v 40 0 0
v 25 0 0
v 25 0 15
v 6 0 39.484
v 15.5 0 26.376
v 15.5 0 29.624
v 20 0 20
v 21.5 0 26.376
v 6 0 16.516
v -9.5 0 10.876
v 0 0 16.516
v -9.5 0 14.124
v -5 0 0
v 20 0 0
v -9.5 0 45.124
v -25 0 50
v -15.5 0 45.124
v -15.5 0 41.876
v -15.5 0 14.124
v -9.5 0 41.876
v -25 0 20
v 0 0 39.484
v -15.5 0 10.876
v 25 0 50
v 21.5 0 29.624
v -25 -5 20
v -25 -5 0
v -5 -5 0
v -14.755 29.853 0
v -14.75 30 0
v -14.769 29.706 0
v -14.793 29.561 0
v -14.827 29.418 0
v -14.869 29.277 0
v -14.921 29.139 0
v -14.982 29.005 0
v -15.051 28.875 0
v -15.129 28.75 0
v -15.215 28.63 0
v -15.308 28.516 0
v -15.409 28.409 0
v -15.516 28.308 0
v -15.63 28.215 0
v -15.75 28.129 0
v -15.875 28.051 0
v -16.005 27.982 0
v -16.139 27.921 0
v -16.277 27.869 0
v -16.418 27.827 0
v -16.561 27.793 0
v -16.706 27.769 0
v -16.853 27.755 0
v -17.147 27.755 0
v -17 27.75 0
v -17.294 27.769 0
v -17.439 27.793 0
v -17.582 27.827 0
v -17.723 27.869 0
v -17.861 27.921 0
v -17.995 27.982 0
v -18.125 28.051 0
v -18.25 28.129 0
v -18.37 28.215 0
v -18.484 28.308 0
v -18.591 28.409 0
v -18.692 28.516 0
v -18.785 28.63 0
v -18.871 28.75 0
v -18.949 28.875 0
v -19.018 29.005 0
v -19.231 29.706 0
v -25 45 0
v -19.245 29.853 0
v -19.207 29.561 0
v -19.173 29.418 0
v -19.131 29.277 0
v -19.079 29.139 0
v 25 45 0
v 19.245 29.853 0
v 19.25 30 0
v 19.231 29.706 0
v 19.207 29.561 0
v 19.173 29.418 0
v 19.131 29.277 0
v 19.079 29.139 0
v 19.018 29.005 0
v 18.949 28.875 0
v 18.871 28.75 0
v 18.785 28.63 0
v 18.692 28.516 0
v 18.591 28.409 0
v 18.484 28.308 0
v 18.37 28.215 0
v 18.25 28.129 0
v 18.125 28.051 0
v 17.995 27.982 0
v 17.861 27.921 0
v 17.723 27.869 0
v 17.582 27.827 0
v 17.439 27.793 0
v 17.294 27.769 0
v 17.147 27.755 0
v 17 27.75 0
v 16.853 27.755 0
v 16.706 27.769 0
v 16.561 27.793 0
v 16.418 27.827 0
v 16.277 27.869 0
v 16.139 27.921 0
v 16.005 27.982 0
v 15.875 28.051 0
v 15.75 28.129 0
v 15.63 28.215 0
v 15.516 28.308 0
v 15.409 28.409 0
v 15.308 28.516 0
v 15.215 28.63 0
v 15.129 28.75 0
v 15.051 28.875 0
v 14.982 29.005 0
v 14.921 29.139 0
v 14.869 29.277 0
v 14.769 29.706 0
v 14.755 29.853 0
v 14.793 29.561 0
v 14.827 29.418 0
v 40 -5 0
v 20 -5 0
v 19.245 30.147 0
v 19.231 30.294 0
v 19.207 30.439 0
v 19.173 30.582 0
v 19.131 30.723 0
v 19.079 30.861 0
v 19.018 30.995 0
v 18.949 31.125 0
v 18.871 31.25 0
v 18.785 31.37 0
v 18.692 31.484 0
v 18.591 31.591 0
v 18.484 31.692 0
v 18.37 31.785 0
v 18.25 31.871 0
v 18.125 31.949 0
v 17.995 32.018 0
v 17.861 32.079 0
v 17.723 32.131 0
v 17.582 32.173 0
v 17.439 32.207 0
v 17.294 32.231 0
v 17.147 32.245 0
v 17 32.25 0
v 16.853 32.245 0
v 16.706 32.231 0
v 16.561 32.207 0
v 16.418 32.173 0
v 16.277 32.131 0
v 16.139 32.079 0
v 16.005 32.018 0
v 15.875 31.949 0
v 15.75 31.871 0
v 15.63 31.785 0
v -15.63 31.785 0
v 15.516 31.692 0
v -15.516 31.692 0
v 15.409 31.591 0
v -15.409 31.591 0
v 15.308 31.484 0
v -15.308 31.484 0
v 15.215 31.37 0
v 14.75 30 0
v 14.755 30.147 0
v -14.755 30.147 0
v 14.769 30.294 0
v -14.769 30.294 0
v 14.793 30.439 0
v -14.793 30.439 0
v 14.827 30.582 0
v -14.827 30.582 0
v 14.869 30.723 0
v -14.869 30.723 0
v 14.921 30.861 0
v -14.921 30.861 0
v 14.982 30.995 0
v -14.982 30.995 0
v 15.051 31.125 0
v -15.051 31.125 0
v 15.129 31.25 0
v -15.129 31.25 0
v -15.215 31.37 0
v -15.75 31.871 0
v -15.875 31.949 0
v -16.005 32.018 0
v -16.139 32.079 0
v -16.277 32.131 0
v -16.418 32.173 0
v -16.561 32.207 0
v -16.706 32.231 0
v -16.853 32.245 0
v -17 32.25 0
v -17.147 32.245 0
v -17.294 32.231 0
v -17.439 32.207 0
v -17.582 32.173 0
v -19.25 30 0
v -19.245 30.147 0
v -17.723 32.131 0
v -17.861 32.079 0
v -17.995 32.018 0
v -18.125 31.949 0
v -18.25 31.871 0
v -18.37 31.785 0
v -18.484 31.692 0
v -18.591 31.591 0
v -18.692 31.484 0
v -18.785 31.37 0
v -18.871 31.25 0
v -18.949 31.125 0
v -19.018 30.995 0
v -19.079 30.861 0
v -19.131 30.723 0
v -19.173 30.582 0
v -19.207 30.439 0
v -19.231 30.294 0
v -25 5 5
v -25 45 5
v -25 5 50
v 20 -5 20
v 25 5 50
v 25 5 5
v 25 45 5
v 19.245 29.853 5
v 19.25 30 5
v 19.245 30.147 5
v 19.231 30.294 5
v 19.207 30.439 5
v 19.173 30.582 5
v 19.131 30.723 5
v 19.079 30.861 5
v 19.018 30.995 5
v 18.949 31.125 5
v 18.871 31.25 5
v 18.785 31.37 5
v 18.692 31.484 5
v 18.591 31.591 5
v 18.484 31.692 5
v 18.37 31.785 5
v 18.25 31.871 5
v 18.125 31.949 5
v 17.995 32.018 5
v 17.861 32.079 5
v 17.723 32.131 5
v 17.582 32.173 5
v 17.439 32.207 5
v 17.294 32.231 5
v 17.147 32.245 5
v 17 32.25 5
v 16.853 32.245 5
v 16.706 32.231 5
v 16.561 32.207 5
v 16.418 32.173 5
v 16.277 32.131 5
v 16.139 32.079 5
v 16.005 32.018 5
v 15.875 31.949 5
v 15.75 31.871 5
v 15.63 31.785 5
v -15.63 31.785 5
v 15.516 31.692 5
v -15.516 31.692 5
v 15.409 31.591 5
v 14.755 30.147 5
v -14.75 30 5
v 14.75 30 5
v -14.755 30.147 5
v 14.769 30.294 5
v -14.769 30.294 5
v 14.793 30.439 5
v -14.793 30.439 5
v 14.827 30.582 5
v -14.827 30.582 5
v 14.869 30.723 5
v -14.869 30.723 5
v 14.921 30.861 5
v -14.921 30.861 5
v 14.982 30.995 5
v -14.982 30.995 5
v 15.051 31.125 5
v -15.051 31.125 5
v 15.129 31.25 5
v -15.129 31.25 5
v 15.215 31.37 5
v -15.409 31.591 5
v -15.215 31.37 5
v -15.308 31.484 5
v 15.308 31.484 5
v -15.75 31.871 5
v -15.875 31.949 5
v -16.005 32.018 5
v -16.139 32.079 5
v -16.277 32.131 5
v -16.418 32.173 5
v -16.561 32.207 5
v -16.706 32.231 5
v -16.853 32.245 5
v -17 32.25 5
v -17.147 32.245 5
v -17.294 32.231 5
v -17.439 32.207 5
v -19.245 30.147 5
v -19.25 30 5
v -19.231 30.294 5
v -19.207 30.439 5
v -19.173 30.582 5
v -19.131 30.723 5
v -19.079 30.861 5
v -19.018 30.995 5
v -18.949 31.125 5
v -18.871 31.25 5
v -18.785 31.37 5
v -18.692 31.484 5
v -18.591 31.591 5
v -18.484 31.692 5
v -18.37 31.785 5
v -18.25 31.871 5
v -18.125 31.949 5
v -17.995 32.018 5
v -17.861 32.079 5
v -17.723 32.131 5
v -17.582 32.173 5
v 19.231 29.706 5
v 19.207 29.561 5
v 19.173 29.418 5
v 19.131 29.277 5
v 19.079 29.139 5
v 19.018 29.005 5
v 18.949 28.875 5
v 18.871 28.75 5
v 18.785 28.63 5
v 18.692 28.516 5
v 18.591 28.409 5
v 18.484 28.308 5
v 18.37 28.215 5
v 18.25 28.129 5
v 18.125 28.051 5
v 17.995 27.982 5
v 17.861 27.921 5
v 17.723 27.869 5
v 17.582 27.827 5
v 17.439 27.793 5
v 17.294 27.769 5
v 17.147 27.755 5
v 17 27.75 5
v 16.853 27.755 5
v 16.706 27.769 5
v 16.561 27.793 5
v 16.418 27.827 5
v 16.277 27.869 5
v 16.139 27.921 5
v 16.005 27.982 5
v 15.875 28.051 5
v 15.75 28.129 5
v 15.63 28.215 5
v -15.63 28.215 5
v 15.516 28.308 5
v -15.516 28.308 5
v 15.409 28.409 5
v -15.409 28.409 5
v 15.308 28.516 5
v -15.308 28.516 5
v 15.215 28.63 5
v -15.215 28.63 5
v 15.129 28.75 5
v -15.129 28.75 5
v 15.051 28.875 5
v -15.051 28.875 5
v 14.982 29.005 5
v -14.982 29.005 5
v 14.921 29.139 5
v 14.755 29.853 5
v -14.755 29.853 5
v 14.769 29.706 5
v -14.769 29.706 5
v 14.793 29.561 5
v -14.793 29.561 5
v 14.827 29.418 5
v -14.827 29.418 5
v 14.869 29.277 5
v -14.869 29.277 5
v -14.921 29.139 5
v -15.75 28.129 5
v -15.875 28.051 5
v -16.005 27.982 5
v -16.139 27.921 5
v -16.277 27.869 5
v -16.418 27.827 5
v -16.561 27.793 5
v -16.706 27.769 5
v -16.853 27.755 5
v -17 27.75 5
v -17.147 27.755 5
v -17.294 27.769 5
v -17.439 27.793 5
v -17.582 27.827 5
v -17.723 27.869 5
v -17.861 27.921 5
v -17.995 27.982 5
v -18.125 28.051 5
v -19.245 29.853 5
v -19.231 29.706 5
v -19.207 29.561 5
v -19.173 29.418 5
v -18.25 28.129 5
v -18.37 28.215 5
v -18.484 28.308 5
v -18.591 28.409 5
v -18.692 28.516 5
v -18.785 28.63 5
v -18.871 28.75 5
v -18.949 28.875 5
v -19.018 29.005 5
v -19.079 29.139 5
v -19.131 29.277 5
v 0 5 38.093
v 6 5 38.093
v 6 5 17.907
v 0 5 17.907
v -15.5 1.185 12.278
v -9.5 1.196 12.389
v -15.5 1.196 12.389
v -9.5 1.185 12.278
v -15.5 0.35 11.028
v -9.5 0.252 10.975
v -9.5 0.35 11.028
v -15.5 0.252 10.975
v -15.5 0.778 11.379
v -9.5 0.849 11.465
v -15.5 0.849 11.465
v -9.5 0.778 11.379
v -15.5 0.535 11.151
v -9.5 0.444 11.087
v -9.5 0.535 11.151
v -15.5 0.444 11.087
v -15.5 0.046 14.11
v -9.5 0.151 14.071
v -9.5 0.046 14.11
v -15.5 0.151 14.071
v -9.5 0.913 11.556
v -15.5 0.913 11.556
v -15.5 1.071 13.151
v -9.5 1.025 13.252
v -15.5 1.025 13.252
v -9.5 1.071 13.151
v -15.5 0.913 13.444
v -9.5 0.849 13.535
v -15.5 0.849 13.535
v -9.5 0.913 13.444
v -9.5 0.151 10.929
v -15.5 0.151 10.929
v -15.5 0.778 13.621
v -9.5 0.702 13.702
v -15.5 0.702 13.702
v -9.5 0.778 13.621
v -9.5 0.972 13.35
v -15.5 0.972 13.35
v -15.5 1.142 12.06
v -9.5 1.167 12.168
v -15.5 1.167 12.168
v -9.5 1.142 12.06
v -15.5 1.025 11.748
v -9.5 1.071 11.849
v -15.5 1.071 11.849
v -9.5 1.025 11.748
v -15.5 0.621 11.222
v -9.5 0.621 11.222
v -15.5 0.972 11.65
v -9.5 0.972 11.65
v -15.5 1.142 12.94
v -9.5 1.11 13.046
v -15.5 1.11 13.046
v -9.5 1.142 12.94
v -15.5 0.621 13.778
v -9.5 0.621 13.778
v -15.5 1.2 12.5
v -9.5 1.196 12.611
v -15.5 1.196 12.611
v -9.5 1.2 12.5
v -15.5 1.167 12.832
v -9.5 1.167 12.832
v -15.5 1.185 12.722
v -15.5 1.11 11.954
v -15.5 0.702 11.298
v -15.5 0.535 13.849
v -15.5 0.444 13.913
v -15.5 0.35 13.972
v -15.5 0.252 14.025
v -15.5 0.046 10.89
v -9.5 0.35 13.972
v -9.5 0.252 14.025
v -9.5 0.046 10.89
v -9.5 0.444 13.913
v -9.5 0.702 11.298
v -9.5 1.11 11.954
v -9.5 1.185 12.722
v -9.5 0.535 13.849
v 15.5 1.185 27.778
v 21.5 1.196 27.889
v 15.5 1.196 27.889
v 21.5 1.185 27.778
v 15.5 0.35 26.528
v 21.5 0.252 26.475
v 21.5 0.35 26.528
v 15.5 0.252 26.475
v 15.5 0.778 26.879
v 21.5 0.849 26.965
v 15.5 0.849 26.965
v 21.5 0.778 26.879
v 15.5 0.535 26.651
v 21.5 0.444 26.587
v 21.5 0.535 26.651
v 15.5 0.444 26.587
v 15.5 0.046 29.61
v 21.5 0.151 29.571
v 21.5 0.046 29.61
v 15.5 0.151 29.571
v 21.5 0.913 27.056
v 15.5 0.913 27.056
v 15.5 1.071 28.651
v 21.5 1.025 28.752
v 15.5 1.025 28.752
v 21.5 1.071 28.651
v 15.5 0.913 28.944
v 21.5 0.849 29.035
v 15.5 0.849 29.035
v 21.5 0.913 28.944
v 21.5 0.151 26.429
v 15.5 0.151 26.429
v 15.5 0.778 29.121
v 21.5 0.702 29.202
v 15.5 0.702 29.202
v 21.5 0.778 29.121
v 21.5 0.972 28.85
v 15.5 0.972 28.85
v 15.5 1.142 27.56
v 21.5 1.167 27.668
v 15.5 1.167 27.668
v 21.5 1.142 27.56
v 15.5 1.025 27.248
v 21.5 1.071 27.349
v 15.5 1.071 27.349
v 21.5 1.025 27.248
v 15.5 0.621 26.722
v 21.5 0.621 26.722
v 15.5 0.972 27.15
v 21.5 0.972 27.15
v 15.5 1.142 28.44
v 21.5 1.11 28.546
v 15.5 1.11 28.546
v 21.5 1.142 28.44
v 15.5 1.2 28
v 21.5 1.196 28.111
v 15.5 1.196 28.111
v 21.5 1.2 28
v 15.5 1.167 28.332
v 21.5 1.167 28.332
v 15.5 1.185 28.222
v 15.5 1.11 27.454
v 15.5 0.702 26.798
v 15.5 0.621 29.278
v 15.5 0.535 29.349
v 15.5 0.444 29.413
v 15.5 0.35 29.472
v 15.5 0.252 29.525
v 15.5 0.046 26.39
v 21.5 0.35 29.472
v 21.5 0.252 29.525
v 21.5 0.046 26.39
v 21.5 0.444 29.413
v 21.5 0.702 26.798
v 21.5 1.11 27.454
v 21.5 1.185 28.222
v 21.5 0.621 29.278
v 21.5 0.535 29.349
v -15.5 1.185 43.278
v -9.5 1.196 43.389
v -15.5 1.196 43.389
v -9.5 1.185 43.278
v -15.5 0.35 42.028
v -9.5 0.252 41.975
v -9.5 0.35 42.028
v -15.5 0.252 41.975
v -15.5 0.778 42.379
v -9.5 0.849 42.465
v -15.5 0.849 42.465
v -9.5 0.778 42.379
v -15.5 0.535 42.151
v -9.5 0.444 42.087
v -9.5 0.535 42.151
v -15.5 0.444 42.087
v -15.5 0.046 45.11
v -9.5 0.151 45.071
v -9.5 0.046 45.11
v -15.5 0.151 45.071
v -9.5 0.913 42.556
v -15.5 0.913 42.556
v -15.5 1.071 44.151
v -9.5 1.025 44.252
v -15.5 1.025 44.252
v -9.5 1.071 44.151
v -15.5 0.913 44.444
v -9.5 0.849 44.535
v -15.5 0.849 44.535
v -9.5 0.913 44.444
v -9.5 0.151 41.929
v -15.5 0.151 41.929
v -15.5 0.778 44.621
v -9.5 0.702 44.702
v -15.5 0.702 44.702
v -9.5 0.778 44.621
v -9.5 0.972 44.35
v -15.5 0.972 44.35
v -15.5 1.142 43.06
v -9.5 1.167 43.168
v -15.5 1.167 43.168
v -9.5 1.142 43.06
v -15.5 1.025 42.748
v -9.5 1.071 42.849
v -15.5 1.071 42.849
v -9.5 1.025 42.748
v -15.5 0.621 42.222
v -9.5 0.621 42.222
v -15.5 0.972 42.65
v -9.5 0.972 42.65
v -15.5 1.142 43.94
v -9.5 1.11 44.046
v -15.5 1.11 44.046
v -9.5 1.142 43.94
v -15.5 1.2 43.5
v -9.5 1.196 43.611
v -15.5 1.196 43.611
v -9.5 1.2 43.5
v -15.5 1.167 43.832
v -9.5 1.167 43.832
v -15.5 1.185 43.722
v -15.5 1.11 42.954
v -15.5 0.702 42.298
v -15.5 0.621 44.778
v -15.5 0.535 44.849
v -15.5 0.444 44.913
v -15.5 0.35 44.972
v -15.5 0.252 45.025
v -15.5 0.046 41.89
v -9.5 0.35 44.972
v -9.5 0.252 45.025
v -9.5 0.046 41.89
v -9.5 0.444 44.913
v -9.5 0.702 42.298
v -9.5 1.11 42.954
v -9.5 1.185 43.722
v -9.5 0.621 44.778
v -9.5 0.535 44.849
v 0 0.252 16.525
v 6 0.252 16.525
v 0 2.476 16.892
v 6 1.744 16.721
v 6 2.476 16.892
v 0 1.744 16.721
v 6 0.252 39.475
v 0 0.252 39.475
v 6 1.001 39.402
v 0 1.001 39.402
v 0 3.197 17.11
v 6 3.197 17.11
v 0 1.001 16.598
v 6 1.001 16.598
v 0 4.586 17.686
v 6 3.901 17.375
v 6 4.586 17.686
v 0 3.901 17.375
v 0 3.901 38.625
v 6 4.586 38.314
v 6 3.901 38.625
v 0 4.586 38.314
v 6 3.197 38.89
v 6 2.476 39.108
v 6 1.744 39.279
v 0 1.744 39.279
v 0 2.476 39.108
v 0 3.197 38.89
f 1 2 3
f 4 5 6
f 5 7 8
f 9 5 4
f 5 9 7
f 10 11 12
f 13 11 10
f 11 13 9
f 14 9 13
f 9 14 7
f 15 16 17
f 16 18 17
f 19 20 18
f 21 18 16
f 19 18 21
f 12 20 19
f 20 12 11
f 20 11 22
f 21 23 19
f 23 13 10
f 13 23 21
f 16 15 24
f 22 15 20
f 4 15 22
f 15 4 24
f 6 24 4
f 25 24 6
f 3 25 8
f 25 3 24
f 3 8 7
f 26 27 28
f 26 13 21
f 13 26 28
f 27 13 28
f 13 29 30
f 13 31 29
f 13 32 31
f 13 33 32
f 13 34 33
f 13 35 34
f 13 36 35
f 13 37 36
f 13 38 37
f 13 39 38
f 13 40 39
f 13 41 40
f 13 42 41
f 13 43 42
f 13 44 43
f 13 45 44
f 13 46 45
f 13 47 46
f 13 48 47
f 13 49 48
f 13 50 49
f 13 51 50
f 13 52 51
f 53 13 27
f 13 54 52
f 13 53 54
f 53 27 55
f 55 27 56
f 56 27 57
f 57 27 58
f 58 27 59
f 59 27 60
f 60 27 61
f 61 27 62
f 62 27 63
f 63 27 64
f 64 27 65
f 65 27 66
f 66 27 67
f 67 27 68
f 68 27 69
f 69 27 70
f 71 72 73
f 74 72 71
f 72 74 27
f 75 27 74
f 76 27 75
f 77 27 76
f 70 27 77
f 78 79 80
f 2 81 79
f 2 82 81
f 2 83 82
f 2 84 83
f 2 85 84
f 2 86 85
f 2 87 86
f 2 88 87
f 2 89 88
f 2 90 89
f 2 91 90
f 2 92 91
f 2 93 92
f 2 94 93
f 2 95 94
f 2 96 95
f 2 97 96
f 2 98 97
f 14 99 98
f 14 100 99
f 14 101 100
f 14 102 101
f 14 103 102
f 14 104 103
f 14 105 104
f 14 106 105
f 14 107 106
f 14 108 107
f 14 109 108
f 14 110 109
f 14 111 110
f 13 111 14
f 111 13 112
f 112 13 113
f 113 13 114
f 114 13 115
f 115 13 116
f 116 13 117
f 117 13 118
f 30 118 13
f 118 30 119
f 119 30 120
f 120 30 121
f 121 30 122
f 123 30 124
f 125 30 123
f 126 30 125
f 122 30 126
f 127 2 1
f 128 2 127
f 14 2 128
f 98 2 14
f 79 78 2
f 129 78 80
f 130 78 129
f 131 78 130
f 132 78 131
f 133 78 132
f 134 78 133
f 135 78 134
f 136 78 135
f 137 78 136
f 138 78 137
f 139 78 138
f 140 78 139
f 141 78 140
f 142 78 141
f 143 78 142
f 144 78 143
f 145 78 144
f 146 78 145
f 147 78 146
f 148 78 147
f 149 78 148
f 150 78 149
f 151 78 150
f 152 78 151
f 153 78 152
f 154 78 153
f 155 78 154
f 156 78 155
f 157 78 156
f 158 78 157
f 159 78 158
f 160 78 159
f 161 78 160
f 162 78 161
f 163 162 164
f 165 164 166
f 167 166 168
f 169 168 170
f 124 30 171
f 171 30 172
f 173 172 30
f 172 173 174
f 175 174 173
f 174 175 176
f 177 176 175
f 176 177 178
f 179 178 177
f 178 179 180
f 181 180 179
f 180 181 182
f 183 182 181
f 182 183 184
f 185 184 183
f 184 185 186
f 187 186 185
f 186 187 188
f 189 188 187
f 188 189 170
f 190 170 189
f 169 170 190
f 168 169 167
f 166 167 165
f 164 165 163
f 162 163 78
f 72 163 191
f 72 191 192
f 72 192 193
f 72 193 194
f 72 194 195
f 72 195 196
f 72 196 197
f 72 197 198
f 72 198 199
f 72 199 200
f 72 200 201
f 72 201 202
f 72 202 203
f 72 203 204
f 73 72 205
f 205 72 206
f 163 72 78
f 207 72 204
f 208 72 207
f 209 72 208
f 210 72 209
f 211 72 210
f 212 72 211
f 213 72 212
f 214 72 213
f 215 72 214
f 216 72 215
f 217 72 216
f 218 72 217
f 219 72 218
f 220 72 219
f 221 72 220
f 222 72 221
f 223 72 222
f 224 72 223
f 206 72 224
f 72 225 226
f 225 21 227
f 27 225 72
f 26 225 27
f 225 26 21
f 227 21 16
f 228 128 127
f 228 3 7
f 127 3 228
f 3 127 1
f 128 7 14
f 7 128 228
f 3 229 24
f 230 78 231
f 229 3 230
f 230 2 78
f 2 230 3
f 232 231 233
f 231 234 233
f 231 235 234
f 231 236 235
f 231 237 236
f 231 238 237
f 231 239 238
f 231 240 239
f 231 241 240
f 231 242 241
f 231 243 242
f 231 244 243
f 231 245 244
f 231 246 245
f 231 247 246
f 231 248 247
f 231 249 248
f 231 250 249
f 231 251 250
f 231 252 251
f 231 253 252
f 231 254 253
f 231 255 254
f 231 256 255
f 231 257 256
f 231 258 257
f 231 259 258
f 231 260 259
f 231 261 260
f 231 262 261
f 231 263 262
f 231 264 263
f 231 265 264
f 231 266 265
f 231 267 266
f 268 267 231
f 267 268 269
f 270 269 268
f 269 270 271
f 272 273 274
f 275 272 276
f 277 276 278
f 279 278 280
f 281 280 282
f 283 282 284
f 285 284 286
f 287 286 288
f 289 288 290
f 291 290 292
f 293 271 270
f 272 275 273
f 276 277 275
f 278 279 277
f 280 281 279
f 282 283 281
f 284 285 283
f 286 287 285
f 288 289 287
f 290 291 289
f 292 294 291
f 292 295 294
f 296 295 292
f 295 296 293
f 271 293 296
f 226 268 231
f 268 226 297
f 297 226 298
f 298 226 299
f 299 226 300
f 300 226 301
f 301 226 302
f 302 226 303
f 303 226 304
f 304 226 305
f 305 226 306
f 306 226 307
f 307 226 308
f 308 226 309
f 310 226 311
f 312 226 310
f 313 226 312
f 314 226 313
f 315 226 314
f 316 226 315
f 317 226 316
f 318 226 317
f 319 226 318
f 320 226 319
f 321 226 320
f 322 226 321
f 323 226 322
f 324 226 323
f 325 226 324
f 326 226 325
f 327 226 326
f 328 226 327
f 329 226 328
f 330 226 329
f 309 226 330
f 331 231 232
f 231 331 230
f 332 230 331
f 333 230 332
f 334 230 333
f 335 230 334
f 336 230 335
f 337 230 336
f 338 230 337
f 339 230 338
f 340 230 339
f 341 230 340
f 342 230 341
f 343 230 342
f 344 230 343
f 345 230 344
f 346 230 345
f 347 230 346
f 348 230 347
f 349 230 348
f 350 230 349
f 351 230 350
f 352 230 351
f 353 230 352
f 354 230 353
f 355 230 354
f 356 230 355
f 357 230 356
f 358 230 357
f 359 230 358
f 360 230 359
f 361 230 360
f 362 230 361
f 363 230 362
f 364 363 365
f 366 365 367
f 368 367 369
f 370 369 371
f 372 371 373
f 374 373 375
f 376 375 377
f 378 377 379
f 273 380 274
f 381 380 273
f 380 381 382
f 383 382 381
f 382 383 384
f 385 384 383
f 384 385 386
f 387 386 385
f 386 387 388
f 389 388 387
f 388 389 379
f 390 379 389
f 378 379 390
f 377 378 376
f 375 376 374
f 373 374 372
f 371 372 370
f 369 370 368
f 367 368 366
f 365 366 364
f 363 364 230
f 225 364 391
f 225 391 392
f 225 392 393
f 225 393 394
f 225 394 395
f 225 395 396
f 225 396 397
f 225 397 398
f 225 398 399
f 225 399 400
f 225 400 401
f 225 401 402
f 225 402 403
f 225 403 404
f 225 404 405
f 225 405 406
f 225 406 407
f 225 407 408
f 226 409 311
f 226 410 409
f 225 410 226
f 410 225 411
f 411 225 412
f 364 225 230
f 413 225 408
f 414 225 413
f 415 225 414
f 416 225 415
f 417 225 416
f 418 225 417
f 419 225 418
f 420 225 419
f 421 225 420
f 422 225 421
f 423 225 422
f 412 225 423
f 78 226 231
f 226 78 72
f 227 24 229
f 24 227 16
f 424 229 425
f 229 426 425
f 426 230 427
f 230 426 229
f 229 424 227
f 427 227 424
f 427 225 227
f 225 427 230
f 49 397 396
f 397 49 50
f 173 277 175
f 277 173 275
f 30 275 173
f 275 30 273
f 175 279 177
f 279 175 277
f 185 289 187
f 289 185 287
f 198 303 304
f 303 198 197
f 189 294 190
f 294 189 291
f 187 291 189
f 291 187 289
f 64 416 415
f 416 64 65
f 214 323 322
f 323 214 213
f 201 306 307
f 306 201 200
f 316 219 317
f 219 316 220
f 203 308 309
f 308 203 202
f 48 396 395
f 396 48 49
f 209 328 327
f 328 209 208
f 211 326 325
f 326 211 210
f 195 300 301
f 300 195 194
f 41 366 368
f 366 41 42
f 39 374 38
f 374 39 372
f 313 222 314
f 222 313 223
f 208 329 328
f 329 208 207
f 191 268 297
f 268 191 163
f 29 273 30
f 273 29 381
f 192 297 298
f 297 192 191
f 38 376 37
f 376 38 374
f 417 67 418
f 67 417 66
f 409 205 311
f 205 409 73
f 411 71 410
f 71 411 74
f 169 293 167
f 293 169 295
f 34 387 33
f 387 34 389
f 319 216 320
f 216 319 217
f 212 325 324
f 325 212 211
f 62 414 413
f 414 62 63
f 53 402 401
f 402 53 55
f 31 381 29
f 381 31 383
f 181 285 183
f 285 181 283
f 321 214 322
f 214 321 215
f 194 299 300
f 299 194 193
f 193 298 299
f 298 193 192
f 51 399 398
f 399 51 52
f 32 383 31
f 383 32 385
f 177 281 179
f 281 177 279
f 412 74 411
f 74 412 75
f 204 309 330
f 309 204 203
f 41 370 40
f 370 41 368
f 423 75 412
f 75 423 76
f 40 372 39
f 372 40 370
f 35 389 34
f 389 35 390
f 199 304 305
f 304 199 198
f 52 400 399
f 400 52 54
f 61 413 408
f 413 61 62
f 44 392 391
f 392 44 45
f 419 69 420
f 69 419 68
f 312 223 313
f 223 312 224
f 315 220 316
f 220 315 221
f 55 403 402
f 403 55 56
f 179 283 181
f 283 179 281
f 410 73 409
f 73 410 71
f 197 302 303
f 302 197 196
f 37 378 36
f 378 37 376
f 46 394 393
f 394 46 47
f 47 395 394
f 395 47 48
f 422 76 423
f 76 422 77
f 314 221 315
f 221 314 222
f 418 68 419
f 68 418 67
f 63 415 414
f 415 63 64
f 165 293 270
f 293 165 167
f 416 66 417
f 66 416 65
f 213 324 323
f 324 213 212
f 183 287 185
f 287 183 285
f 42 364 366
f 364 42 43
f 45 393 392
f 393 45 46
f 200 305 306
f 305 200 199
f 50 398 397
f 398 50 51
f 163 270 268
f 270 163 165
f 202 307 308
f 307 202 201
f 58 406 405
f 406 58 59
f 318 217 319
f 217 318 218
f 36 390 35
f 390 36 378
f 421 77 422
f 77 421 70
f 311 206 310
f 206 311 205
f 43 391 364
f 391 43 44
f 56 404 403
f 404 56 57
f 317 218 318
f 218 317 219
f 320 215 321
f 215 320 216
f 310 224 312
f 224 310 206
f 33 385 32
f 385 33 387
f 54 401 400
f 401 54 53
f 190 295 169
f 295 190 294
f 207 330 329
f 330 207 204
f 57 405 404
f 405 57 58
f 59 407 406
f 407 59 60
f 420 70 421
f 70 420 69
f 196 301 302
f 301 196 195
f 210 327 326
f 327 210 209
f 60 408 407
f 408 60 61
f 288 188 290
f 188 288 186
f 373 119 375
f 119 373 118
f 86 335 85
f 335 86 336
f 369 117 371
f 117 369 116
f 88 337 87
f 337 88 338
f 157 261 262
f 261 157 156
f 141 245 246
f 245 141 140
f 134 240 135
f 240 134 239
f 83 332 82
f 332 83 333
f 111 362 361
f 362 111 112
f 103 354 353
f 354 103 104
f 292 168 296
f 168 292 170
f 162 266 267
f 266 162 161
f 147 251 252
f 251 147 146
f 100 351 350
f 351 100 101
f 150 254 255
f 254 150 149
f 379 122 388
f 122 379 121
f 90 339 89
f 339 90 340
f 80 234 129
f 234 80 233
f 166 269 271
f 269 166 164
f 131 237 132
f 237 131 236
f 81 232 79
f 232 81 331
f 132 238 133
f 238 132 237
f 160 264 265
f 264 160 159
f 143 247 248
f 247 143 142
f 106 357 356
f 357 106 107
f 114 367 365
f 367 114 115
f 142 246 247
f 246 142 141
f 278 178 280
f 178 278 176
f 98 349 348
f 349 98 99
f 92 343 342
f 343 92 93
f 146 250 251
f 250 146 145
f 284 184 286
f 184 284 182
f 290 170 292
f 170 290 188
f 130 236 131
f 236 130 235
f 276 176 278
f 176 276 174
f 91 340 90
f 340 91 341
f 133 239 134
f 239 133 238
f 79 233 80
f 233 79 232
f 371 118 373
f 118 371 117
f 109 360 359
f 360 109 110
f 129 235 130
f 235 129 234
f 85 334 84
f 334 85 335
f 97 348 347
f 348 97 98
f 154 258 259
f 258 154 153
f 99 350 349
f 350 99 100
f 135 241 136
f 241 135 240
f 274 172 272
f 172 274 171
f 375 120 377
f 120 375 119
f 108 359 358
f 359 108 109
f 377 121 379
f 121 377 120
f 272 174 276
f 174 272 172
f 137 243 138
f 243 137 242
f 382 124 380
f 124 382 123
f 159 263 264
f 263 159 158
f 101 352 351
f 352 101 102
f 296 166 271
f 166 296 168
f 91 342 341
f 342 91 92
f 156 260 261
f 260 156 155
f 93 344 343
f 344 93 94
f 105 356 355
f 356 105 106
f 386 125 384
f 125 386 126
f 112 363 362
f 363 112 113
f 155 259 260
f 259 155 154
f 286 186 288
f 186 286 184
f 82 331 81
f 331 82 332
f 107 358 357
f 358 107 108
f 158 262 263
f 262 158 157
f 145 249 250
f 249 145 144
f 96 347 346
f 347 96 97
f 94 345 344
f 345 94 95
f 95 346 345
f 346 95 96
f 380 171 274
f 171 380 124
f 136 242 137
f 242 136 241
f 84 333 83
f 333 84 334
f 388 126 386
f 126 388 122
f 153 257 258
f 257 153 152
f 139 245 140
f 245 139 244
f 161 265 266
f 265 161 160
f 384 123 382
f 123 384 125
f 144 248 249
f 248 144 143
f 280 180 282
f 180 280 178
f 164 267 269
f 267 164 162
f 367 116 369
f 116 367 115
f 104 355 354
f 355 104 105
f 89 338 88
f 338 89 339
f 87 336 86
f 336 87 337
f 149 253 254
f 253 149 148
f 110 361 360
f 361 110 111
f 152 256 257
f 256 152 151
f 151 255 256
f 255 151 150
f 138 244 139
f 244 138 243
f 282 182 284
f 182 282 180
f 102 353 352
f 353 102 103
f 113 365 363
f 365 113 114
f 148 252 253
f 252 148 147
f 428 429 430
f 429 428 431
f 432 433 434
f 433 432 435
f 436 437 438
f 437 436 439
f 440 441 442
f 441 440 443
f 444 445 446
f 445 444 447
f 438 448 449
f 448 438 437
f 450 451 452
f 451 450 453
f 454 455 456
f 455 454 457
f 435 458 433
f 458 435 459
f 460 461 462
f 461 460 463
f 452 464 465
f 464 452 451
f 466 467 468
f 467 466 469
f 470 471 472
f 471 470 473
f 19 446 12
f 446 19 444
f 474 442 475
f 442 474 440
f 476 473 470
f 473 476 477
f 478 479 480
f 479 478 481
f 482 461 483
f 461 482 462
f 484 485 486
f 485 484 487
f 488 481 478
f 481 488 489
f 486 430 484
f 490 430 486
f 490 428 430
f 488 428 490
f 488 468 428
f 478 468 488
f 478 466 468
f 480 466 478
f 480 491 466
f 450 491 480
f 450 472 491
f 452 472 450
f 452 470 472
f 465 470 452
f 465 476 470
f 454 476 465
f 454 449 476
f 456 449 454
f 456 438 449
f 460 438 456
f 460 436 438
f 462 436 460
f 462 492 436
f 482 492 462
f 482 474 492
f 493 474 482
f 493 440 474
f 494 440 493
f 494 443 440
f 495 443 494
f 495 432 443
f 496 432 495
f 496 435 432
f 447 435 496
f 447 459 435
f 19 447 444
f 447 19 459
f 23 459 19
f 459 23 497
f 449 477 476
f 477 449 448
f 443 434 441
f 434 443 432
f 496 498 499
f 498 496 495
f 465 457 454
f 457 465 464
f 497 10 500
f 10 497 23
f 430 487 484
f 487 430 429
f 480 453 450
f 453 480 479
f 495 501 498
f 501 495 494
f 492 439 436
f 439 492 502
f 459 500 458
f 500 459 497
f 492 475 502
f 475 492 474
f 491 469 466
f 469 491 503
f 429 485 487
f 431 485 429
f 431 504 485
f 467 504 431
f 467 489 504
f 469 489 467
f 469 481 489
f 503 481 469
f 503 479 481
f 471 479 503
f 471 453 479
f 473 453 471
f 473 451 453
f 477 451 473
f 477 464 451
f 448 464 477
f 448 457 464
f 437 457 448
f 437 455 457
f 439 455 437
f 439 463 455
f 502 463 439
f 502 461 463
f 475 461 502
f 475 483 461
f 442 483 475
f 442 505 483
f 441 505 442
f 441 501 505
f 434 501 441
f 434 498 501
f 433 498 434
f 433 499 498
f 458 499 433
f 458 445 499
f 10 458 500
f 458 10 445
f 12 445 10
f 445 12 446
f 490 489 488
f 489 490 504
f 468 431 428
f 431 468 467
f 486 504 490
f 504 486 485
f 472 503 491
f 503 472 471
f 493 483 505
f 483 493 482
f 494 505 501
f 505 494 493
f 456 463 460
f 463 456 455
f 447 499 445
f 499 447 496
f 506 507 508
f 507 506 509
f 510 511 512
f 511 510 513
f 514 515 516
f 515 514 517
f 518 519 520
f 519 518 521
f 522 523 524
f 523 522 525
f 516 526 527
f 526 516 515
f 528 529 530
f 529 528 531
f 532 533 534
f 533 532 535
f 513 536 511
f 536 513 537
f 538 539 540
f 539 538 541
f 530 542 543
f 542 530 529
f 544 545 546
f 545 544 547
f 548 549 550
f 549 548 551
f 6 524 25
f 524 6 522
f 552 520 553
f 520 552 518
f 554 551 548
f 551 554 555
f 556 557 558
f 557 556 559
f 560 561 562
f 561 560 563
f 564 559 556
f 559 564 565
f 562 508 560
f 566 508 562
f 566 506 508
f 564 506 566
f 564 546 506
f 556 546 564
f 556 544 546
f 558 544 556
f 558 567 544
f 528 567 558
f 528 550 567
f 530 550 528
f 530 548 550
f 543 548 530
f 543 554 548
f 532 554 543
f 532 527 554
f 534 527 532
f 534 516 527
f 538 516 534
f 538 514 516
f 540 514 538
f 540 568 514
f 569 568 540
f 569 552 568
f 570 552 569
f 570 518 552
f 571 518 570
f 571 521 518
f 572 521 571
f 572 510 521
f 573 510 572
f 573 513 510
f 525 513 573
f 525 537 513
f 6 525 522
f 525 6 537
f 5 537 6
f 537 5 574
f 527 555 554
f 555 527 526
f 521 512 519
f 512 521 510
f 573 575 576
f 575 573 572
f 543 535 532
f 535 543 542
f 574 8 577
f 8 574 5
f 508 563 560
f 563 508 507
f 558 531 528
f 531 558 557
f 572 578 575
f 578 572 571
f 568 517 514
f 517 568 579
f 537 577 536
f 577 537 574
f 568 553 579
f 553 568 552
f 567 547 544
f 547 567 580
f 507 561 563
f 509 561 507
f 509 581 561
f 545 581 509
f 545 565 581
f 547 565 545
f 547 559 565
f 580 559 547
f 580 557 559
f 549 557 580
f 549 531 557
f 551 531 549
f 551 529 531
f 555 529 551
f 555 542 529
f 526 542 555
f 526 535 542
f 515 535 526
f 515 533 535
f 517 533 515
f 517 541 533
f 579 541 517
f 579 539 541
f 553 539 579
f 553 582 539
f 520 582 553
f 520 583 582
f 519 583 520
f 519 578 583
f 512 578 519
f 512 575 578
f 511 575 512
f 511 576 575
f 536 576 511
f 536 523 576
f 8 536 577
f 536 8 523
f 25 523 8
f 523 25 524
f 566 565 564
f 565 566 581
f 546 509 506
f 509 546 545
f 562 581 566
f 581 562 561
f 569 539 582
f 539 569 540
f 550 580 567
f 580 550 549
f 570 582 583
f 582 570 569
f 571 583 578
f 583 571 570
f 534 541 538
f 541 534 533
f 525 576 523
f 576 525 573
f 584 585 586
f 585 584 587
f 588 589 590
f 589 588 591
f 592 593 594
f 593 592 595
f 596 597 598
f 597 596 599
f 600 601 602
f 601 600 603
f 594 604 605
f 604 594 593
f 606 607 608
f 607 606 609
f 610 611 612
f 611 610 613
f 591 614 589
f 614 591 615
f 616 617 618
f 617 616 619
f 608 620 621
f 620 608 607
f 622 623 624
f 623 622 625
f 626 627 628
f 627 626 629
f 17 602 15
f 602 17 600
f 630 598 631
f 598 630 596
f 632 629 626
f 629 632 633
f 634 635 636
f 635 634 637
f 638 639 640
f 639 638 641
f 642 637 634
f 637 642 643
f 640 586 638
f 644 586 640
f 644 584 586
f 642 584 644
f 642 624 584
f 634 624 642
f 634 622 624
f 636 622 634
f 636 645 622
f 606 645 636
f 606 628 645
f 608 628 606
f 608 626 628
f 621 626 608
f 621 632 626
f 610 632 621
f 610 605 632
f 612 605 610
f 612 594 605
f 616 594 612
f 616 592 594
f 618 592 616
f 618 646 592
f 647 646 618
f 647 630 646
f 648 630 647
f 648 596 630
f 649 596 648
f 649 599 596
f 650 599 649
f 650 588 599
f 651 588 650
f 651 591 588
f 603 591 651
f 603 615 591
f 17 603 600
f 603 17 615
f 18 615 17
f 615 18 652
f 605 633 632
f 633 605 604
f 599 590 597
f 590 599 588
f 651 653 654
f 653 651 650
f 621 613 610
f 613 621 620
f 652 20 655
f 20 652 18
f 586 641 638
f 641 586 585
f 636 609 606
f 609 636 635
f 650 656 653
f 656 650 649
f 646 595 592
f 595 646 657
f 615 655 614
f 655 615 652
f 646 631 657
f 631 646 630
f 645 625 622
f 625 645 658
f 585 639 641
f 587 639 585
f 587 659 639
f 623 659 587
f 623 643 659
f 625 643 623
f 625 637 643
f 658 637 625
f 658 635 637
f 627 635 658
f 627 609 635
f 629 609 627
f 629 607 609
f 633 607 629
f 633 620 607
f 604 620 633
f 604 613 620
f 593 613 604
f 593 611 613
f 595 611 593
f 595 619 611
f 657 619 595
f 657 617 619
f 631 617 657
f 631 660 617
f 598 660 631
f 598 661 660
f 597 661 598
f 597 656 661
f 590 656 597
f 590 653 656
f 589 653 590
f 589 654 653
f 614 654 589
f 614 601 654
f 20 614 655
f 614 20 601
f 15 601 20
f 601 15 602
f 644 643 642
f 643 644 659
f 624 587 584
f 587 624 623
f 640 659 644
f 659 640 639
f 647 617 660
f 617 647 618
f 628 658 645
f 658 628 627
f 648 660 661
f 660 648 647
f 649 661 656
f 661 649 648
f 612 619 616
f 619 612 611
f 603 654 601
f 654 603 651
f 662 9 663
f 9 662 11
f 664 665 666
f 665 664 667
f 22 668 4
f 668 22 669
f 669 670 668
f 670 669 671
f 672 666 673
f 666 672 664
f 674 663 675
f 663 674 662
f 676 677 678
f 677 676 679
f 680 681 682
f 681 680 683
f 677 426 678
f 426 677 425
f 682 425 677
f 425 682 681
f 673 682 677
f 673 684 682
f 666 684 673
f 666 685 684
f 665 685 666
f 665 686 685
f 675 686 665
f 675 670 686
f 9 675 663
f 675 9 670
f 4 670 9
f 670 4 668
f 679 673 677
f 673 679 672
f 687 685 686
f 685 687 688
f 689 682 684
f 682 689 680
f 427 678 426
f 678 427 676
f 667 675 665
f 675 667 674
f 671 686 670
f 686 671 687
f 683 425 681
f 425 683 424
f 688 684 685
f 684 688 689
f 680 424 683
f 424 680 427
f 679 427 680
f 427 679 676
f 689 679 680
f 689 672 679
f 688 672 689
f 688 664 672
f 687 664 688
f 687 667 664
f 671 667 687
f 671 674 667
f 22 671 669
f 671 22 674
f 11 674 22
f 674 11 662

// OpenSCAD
// L-shaped mounting bracket for a NEMA 17 stepper motor (e.g. syringe pump)
// Print orientation: base plate on the bed (z = 0), vertical plate builds upward

// ---------- Parameters ----------
base_x0      = -25;    // base plate, x start
base_x1      = 25;     // base plate, x end
base_y0      = 0;      // base plate, y start
base_y1      = 45;     // base plate, y end
base_z1      = 5;      // base plate, z end

motor_x0     = -25;    // motor plate, x start
motor_x1     = 25;     // motor plate, x end
motor_y0     = 0;      // motor plate, y start
motor_y1     = 5;      // motor plate, y end
motor_z1     = 50;     // motor plate, z end

boss_d       = 23;     // motor centring boss hole diameter
boss_x       = 0;      // boss hole centre, x
boss_z       = 28;     // boss hole centre, z

screw_d      = 3.4;    // M3 screw holes diameter
screw_p      = 31;     // screw pattern size (square)
screw_count  = 4;      // number of screw holes

eps          = 0.5;    // cutter overshoot past faces
$fn          = 96;     // curve resolution

// ---------- Model ----------
difference() {
    union() {
        // Base plate
        translate([base_x0, base_y0, 0])
            cube([base_x1 - base_x0, base_y1 - base_y0, base_z1]);

        // Vertical motor plate
        translate([motor_x0, motor_y0, 0])
            cube([motor_x1 - motor_x0, motor_y1 - motor_y0, motor_z1]);

        // Gussets: right triangles in YZ, 5 mm thick, flush with left/right edges
        for (sx = [-1, 1])
            translate([sx > 0 ? motor_x1 - 5 : base_x0, 0, 0])
                rotate([90, 0, 0])
                    linear_extrude(height = 5)
                        polygon([
                            [0, 0],
                            [20, 0],
                            [0, 20]
                        ]);
    }

    // Base plate M4 through-holes
    for (x = [-17, 17], y = 30)
        translate([x, y, -eps])
            cylinder(d = 4.5, h = base_z1 + 2 * eps);

    // Motor plate boss hole (along Y)
    translate([boss_x, motor_y0 - eps, boss_z])
        rotate([0, 90, 0])
            cylinder(d = boss_d, h = motor_y1 - motor_y0 + 2 * eps);

    // M3 screw holes on a square pattern centred on the boss hole
    for (i = [0 : screw_count - 1]) {
        x = (i % 2 - 0.5) * screw_p;
        z = (i / 2 - 0.5) * screw_p + boss_z;
        translate([x, motor_y0 - eps, z])
            rotate([0, 90, 0])
                cylinder(d = screw_d, h = motor_y1 - motor_y0 + 2 * eps);
    }
}
